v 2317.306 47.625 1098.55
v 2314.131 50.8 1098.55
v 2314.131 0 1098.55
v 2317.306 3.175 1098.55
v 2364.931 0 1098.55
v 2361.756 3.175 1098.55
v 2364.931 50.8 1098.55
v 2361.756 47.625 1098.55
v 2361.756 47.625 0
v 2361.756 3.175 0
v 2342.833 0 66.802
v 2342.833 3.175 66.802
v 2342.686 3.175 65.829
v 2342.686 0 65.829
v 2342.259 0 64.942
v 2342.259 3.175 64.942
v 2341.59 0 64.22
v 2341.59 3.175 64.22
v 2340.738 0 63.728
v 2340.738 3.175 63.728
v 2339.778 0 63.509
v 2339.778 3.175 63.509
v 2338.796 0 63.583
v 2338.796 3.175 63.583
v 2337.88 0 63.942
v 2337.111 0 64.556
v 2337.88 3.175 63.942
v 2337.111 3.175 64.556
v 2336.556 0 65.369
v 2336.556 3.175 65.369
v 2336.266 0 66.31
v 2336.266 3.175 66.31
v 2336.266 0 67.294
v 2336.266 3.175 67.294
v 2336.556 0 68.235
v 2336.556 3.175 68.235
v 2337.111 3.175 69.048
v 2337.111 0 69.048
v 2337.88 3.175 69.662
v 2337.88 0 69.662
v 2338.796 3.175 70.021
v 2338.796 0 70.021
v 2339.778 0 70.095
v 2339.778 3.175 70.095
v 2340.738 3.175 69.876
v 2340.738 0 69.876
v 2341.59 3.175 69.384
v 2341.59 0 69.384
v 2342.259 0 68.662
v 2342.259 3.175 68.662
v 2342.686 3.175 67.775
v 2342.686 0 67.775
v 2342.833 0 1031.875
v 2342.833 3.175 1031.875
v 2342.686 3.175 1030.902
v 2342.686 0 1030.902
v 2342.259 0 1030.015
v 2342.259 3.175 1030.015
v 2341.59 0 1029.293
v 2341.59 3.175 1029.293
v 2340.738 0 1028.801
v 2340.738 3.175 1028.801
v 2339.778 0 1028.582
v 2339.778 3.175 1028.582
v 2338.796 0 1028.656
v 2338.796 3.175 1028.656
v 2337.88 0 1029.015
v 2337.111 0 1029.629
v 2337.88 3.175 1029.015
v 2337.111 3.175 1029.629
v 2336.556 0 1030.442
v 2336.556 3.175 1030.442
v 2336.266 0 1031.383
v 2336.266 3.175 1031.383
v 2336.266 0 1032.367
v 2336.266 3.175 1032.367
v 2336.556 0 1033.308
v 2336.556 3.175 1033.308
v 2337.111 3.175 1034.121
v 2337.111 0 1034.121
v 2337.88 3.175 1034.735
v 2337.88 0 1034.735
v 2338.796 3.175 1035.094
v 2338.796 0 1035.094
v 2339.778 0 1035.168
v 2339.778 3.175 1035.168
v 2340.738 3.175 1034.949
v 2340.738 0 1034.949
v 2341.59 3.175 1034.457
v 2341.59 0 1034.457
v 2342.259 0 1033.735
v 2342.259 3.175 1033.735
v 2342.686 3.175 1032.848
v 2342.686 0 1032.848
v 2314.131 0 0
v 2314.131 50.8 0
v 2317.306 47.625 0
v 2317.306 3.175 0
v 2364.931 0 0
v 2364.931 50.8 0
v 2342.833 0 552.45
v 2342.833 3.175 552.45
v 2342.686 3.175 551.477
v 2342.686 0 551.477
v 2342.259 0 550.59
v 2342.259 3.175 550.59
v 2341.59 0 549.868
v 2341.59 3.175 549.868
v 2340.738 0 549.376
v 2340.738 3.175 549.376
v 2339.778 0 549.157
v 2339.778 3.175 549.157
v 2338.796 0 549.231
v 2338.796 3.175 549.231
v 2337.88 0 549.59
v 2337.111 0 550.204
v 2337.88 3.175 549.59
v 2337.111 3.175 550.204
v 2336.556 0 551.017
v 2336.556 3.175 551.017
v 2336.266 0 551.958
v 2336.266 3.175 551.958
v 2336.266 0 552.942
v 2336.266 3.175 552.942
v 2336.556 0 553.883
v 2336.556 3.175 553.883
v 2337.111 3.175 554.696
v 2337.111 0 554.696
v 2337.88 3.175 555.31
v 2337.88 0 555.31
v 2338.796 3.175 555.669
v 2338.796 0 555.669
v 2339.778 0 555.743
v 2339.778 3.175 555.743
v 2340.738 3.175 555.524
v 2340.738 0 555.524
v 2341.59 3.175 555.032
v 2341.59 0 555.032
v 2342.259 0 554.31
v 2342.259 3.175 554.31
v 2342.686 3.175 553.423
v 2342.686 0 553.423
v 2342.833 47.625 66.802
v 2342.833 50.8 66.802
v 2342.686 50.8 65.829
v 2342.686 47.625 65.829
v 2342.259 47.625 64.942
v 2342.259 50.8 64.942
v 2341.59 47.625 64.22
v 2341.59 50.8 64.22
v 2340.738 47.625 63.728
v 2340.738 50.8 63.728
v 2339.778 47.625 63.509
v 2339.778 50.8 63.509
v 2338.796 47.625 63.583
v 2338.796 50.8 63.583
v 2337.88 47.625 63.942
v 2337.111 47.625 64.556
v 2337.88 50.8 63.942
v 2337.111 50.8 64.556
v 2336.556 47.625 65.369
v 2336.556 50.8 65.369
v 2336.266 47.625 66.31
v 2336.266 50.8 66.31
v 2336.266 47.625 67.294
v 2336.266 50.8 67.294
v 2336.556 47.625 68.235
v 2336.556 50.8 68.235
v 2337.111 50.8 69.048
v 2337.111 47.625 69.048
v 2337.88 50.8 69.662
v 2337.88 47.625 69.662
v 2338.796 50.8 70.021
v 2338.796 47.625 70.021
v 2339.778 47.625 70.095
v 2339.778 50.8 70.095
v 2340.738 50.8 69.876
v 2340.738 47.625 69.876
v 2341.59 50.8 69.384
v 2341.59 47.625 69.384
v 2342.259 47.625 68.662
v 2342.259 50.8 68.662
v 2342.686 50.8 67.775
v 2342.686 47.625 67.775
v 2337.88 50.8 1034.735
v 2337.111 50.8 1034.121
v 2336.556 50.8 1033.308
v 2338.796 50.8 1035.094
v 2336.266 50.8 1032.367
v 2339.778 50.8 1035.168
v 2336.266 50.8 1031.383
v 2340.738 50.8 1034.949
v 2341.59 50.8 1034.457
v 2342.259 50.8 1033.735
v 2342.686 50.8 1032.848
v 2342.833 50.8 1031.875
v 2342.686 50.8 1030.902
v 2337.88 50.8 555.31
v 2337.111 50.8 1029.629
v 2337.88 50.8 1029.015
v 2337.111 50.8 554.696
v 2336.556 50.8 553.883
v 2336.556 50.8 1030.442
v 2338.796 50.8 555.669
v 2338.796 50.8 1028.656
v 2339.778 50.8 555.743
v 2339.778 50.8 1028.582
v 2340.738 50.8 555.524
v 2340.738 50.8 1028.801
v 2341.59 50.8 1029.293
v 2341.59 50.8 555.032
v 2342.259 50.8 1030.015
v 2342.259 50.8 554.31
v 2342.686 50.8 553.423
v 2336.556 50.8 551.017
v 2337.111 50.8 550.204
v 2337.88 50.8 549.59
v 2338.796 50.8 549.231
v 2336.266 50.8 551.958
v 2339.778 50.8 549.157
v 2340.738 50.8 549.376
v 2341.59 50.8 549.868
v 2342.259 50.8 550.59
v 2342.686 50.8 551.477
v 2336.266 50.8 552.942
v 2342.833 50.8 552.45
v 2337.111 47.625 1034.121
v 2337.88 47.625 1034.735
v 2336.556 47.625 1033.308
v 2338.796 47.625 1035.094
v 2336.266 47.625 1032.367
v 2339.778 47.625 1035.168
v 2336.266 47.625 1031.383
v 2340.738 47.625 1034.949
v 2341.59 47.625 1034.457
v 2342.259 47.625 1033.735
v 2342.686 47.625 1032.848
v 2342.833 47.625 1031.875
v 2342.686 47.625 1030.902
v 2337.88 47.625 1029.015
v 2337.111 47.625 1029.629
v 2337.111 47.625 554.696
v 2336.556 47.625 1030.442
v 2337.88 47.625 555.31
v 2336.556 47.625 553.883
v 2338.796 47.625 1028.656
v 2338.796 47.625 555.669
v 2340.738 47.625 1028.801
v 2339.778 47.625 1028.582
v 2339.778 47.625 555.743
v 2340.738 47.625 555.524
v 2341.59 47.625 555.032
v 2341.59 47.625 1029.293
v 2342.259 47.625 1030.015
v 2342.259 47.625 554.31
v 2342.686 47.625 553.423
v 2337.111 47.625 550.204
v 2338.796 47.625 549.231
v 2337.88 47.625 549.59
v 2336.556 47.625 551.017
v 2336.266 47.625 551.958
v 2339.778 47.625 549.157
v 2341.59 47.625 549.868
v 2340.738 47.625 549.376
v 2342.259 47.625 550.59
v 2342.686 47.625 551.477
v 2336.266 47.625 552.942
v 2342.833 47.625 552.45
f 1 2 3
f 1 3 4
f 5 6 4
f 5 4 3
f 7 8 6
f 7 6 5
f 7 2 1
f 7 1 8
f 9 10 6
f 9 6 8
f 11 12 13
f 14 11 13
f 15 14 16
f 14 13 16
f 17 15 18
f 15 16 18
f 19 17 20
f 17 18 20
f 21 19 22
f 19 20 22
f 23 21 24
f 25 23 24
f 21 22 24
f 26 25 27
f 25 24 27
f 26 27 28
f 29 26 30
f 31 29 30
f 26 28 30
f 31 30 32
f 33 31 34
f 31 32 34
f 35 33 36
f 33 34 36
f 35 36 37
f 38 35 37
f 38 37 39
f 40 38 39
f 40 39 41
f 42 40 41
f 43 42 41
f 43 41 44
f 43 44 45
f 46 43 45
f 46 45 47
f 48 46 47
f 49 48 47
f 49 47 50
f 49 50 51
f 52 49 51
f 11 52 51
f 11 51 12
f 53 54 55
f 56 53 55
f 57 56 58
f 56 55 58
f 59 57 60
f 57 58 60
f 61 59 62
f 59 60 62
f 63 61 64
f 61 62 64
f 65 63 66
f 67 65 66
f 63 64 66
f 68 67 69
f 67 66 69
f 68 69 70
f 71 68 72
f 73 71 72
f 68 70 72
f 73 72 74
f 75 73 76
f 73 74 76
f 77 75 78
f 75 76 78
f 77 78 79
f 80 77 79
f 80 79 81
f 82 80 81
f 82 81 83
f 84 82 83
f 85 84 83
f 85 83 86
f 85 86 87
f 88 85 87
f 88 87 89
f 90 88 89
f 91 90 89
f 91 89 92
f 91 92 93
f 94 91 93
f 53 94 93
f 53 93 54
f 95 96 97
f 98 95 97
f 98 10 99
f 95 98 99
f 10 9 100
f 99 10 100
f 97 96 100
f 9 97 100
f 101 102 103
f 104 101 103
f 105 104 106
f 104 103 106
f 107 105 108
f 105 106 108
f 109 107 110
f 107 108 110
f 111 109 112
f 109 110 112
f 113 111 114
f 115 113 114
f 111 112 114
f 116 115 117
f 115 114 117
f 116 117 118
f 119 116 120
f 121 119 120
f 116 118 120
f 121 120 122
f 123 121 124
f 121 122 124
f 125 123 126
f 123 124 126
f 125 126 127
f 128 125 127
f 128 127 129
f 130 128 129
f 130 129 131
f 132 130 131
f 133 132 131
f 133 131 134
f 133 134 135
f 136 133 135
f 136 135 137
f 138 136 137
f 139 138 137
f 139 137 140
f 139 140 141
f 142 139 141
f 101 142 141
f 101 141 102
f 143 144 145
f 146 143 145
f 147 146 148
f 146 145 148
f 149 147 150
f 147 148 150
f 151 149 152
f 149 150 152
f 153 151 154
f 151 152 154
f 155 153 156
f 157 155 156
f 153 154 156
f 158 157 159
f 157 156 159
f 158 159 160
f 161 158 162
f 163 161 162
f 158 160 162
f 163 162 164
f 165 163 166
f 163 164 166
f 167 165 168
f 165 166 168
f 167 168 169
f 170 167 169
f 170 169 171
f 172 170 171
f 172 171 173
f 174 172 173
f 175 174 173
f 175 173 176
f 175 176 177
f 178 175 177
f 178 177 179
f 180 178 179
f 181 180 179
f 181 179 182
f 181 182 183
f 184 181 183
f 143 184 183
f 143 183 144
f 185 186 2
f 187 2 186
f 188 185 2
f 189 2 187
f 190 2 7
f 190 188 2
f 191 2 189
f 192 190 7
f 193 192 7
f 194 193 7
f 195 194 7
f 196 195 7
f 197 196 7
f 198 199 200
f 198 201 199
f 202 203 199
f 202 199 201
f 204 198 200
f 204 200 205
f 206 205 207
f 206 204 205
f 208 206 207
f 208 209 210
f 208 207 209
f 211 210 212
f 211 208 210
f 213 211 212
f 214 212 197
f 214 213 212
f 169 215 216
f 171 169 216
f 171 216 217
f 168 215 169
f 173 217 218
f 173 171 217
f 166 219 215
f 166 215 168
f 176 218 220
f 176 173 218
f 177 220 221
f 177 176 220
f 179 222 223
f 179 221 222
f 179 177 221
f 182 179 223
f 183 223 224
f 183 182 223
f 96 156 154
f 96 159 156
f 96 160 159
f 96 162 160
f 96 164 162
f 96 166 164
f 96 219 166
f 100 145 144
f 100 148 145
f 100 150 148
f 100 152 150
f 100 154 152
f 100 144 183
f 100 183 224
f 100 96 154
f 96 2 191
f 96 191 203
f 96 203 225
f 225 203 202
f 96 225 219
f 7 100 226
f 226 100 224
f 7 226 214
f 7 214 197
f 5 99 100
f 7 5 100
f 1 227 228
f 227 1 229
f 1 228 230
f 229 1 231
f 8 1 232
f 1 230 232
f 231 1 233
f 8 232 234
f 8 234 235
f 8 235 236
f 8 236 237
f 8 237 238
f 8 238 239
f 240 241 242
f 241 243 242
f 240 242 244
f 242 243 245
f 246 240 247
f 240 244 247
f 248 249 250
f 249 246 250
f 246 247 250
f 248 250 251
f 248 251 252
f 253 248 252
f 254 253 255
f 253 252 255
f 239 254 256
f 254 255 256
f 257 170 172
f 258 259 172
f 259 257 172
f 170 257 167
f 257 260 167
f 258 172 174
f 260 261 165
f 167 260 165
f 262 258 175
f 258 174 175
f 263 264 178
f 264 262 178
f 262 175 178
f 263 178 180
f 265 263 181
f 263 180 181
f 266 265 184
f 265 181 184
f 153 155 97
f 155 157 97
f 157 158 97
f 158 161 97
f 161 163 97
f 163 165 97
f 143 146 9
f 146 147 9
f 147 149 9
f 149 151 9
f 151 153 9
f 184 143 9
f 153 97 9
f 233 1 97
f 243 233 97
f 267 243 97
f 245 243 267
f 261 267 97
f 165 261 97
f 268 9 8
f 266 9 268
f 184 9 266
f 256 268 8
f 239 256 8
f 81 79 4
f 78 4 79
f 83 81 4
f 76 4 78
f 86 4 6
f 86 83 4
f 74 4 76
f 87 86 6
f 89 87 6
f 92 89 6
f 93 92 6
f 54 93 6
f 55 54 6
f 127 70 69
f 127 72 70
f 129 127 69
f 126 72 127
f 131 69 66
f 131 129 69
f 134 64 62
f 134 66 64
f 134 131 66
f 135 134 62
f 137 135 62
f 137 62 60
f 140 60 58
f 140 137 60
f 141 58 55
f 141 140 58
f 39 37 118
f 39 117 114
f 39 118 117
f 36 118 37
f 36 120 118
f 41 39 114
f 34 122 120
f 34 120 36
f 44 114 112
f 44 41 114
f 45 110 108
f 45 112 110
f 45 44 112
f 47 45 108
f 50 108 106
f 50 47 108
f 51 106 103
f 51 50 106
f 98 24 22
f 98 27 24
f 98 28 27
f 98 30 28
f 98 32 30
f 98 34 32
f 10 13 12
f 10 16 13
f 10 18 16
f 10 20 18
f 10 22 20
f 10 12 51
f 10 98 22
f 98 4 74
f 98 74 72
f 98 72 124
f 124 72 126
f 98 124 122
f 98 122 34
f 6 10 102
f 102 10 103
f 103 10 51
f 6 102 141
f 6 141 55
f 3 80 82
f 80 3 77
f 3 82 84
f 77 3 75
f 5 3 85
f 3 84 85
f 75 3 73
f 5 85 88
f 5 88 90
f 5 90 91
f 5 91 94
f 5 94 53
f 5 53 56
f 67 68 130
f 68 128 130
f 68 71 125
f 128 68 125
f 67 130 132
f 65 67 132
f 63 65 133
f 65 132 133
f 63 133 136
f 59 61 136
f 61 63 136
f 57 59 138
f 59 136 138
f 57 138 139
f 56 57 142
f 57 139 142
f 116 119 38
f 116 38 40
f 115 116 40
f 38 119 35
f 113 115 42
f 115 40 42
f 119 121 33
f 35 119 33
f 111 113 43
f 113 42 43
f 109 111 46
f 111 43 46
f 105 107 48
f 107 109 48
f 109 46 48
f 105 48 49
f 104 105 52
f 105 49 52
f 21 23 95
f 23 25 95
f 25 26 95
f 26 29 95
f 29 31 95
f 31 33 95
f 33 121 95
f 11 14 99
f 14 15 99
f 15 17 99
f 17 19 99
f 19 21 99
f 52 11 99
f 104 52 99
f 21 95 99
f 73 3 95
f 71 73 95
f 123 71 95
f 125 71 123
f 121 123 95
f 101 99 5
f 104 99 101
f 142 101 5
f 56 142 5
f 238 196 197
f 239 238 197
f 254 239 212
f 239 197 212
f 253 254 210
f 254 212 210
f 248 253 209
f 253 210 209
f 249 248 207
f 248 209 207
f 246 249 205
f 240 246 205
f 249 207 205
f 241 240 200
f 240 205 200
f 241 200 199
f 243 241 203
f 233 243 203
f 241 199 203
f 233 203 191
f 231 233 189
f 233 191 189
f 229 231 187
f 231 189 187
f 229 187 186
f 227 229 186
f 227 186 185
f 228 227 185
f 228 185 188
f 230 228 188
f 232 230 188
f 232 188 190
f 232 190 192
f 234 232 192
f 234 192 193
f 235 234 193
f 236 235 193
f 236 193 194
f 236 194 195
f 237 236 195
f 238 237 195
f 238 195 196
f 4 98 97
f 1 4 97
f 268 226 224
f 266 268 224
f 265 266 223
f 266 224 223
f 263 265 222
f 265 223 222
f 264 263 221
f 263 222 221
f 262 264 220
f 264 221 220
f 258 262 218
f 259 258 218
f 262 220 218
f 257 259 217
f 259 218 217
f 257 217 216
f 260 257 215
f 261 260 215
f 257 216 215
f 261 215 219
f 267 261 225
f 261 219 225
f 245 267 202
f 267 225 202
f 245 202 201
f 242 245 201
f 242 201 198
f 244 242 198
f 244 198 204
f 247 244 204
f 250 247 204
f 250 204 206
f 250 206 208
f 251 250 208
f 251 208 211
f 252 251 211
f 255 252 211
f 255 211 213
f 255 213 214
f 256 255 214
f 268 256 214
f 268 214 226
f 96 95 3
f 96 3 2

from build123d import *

# Parameters (mm, degrees)
SKETCH1_W           = 50.8
SKETCH1_H           = 50.8
SKETCH1_W_2         = 44.45
SKETCH1_H_2         = 44.45
BOSS_EXTRUDE1_DEPTH = 1098.55
SKETCH2_R           = 3.302
CUT_EXTRUDE1_DEPTH  = 50.8


with BuildPart() as part:
    # Sketch1 → Boss-Extrude1 (new body)
    with BuildSketch(Plane.XY):
        with Locations((2339.531183146, 25.4)):
            Rectangle(SKETCH1_W, SKETCH1_H)
        with Locations((2339.531183146, 25.4)):
            Rectangle(SKETCH1_W_2, SKETCH1_H_2, mode=Mode.SUBTRACT)
    extrude(amount=BOSS_EXTRUDE1_DEPTH)

    # Sketch2 → Cut-Extrude1 (cut)
    with BuildSketch(Plane(origin=(0, 50.8, 0), x_dir=(1, 0, 0), z_dir=(0, 1, 0))):
        with Locations((2339.531183146, -552.45)):
            Circle(SKETCH2_R)
        with Locations((2339.531183146, -1031.875)):
            Circle(SKETCH2_R)
        with Locations((2339.531183146, -66.802)):
            Circle(SKETCH2_R)
    extrude(amount=-CUT_EXTRUDE1_DEPTH, mode=Mode.SUBTRACT)


solid = part.part
